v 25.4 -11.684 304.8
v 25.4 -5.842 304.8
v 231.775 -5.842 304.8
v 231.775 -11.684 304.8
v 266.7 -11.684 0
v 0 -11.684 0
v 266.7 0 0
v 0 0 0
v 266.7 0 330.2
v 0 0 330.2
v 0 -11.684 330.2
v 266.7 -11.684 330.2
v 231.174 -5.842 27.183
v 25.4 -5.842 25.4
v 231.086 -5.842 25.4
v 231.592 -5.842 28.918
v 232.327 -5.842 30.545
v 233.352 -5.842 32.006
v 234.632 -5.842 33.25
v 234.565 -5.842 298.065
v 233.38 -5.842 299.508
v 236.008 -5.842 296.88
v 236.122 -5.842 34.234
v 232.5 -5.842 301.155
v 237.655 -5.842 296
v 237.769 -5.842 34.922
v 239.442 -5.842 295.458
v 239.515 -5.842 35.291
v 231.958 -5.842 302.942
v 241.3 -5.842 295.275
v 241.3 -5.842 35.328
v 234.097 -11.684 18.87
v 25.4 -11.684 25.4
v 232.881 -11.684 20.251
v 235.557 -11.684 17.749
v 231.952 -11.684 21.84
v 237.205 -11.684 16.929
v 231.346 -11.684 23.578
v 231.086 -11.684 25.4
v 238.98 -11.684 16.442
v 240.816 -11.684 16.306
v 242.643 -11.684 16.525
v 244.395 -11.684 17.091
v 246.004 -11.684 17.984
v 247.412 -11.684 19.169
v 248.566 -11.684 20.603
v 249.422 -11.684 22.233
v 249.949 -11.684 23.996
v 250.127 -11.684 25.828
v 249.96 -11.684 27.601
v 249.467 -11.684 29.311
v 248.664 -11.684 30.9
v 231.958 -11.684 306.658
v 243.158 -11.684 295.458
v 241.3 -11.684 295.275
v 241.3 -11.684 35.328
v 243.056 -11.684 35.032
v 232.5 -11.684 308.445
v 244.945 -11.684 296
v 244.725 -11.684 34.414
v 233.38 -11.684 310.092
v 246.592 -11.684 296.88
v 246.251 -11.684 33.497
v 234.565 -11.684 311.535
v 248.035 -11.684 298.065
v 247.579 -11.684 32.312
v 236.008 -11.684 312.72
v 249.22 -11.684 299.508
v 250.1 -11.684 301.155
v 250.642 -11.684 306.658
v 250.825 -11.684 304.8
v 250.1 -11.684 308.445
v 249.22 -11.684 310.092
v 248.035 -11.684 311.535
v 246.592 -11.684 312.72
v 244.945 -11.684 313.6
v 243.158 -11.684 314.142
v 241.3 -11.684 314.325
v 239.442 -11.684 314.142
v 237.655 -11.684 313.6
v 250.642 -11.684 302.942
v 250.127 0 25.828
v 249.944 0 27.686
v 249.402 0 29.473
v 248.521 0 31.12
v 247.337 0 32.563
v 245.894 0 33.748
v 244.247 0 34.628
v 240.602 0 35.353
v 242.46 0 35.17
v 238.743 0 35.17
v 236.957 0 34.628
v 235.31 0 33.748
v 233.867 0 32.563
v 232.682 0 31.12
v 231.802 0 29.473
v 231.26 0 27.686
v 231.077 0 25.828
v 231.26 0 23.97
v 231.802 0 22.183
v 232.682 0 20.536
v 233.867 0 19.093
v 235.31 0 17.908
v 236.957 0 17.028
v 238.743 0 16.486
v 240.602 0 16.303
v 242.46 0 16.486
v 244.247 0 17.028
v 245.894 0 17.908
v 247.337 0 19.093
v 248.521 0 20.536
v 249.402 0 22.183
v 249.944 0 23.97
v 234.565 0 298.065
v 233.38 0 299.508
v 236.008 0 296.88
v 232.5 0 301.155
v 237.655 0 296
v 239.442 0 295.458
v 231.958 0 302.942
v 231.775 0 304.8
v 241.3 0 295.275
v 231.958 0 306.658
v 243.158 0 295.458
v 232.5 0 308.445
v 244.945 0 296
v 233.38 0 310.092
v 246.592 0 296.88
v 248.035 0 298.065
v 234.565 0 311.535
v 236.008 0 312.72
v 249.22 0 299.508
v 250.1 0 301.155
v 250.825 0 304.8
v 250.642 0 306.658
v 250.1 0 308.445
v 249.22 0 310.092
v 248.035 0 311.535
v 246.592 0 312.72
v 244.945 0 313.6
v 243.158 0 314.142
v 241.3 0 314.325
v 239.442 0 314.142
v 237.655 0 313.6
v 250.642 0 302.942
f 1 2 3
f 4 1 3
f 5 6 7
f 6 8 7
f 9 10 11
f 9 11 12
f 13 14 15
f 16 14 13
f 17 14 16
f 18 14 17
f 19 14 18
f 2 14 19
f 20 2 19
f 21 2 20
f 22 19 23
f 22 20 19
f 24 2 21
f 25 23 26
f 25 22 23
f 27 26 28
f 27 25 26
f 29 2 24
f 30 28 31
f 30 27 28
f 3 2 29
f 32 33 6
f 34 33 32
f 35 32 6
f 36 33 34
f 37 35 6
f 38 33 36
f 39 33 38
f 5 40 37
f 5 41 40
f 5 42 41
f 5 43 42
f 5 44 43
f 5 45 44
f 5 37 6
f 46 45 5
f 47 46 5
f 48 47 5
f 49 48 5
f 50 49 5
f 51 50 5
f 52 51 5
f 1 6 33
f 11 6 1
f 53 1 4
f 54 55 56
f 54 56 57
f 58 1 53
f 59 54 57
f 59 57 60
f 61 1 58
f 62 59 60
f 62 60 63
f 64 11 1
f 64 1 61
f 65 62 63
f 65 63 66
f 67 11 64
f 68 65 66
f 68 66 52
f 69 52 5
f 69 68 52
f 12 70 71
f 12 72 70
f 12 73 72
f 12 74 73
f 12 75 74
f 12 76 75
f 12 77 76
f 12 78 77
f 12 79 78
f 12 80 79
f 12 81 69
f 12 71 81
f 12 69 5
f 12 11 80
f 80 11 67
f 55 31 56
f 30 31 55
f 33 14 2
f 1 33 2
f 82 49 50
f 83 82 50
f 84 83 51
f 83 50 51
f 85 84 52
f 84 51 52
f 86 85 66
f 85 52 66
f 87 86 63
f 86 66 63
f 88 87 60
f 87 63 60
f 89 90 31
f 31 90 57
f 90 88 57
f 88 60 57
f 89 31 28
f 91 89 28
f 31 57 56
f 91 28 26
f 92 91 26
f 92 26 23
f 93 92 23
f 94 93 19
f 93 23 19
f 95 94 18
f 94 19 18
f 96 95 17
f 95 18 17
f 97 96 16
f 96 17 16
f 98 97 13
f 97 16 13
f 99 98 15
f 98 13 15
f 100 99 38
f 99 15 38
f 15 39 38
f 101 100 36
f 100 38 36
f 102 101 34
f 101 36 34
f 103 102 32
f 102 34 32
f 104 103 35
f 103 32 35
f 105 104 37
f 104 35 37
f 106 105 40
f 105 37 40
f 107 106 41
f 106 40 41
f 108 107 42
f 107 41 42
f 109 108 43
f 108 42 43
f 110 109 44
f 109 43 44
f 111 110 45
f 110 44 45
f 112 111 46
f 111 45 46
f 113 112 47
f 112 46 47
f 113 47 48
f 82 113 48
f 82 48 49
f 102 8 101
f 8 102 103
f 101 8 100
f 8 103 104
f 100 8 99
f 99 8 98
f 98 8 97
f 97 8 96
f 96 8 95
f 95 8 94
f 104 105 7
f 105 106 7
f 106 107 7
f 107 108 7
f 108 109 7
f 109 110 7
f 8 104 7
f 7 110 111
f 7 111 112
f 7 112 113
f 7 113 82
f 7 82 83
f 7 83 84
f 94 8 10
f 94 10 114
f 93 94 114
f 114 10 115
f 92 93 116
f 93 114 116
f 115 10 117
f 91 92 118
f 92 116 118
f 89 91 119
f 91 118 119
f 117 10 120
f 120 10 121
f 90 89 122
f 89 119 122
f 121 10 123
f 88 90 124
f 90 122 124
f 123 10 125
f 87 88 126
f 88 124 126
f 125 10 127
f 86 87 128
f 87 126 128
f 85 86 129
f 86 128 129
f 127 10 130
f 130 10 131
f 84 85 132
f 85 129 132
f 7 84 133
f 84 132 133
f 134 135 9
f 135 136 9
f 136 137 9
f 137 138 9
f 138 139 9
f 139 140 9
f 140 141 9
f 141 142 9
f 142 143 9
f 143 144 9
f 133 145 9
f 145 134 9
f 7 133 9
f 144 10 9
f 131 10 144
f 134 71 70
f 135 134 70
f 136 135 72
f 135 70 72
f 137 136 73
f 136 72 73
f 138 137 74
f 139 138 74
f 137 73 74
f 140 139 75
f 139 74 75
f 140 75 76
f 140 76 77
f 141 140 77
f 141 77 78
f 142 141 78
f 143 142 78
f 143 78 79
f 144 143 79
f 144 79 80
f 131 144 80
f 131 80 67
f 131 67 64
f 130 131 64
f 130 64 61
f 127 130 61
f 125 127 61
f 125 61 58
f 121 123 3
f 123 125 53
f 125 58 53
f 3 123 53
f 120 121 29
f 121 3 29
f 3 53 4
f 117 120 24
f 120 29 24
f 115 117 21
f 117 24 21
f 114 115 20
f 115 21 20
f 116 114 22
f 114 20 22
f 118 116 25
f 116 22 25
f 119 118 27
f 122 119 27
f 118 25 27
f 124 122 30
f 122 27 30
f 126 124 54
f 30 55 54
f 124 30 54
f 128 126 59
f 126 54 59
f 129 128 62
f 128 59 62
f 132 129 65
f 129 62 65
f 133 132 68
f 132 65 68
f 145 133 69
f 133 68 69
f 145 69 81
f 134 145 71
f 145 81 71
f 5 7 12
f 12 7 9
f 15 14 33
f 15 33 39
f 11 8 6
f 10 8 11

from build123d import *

# Parameters (mm, degrees)
F0_W     = 266.7
F0_H     = 330.2
F1_DEPTH = 5.842
F2_W     = 266.7
F2_H     = 330.2
F2_W_2   = 215.9
F2_H_2   = 279.4
F3_DEPTH = 5.842
F6_R     = 9.525
F7_DEPTH = 11.685


with BuildPart() as f1:
    # F0 (on Front) → F1 (new body)
    with BuildSketch(Plane.XZ):
        with Locations((133.35, 165.1)):
            Rectangle(F0_W, F0_H)
    extrude(amount=F1_DEPTH)


with BuildPart() as f3:
    # F2 (on face) → F3 (new body)
    with BuildSketch(Plane.XZ.offset(5.842)):
        with Locations((133.35, 165.1)):
            Rectangle(F2_W, F2_H)
        with Locations((133.35, 165.1)):
            Rectangle(F2_W_2, F2_H_2, mode=Mode.SUBTRACT)
    extrude(amount=F3_DEPTH)


with BuildPart() as f1_1:
    add(f1.part)

    # F4: union F3
    add(f3.part)

    # F6 (on face) → F7 (cut, through all)
    with BuildSketch(Plane.XZ.offset(11.684)):
        with Locations((241.3, 304.8)):
            Circle(F6_R)
        with Locations((240.601733, 25.828205)):
            Circle(F6_R)
    extrude(amount=-F7_DEPTH, mode=Mode.SUBTRACT)


solid = f1_1.part
